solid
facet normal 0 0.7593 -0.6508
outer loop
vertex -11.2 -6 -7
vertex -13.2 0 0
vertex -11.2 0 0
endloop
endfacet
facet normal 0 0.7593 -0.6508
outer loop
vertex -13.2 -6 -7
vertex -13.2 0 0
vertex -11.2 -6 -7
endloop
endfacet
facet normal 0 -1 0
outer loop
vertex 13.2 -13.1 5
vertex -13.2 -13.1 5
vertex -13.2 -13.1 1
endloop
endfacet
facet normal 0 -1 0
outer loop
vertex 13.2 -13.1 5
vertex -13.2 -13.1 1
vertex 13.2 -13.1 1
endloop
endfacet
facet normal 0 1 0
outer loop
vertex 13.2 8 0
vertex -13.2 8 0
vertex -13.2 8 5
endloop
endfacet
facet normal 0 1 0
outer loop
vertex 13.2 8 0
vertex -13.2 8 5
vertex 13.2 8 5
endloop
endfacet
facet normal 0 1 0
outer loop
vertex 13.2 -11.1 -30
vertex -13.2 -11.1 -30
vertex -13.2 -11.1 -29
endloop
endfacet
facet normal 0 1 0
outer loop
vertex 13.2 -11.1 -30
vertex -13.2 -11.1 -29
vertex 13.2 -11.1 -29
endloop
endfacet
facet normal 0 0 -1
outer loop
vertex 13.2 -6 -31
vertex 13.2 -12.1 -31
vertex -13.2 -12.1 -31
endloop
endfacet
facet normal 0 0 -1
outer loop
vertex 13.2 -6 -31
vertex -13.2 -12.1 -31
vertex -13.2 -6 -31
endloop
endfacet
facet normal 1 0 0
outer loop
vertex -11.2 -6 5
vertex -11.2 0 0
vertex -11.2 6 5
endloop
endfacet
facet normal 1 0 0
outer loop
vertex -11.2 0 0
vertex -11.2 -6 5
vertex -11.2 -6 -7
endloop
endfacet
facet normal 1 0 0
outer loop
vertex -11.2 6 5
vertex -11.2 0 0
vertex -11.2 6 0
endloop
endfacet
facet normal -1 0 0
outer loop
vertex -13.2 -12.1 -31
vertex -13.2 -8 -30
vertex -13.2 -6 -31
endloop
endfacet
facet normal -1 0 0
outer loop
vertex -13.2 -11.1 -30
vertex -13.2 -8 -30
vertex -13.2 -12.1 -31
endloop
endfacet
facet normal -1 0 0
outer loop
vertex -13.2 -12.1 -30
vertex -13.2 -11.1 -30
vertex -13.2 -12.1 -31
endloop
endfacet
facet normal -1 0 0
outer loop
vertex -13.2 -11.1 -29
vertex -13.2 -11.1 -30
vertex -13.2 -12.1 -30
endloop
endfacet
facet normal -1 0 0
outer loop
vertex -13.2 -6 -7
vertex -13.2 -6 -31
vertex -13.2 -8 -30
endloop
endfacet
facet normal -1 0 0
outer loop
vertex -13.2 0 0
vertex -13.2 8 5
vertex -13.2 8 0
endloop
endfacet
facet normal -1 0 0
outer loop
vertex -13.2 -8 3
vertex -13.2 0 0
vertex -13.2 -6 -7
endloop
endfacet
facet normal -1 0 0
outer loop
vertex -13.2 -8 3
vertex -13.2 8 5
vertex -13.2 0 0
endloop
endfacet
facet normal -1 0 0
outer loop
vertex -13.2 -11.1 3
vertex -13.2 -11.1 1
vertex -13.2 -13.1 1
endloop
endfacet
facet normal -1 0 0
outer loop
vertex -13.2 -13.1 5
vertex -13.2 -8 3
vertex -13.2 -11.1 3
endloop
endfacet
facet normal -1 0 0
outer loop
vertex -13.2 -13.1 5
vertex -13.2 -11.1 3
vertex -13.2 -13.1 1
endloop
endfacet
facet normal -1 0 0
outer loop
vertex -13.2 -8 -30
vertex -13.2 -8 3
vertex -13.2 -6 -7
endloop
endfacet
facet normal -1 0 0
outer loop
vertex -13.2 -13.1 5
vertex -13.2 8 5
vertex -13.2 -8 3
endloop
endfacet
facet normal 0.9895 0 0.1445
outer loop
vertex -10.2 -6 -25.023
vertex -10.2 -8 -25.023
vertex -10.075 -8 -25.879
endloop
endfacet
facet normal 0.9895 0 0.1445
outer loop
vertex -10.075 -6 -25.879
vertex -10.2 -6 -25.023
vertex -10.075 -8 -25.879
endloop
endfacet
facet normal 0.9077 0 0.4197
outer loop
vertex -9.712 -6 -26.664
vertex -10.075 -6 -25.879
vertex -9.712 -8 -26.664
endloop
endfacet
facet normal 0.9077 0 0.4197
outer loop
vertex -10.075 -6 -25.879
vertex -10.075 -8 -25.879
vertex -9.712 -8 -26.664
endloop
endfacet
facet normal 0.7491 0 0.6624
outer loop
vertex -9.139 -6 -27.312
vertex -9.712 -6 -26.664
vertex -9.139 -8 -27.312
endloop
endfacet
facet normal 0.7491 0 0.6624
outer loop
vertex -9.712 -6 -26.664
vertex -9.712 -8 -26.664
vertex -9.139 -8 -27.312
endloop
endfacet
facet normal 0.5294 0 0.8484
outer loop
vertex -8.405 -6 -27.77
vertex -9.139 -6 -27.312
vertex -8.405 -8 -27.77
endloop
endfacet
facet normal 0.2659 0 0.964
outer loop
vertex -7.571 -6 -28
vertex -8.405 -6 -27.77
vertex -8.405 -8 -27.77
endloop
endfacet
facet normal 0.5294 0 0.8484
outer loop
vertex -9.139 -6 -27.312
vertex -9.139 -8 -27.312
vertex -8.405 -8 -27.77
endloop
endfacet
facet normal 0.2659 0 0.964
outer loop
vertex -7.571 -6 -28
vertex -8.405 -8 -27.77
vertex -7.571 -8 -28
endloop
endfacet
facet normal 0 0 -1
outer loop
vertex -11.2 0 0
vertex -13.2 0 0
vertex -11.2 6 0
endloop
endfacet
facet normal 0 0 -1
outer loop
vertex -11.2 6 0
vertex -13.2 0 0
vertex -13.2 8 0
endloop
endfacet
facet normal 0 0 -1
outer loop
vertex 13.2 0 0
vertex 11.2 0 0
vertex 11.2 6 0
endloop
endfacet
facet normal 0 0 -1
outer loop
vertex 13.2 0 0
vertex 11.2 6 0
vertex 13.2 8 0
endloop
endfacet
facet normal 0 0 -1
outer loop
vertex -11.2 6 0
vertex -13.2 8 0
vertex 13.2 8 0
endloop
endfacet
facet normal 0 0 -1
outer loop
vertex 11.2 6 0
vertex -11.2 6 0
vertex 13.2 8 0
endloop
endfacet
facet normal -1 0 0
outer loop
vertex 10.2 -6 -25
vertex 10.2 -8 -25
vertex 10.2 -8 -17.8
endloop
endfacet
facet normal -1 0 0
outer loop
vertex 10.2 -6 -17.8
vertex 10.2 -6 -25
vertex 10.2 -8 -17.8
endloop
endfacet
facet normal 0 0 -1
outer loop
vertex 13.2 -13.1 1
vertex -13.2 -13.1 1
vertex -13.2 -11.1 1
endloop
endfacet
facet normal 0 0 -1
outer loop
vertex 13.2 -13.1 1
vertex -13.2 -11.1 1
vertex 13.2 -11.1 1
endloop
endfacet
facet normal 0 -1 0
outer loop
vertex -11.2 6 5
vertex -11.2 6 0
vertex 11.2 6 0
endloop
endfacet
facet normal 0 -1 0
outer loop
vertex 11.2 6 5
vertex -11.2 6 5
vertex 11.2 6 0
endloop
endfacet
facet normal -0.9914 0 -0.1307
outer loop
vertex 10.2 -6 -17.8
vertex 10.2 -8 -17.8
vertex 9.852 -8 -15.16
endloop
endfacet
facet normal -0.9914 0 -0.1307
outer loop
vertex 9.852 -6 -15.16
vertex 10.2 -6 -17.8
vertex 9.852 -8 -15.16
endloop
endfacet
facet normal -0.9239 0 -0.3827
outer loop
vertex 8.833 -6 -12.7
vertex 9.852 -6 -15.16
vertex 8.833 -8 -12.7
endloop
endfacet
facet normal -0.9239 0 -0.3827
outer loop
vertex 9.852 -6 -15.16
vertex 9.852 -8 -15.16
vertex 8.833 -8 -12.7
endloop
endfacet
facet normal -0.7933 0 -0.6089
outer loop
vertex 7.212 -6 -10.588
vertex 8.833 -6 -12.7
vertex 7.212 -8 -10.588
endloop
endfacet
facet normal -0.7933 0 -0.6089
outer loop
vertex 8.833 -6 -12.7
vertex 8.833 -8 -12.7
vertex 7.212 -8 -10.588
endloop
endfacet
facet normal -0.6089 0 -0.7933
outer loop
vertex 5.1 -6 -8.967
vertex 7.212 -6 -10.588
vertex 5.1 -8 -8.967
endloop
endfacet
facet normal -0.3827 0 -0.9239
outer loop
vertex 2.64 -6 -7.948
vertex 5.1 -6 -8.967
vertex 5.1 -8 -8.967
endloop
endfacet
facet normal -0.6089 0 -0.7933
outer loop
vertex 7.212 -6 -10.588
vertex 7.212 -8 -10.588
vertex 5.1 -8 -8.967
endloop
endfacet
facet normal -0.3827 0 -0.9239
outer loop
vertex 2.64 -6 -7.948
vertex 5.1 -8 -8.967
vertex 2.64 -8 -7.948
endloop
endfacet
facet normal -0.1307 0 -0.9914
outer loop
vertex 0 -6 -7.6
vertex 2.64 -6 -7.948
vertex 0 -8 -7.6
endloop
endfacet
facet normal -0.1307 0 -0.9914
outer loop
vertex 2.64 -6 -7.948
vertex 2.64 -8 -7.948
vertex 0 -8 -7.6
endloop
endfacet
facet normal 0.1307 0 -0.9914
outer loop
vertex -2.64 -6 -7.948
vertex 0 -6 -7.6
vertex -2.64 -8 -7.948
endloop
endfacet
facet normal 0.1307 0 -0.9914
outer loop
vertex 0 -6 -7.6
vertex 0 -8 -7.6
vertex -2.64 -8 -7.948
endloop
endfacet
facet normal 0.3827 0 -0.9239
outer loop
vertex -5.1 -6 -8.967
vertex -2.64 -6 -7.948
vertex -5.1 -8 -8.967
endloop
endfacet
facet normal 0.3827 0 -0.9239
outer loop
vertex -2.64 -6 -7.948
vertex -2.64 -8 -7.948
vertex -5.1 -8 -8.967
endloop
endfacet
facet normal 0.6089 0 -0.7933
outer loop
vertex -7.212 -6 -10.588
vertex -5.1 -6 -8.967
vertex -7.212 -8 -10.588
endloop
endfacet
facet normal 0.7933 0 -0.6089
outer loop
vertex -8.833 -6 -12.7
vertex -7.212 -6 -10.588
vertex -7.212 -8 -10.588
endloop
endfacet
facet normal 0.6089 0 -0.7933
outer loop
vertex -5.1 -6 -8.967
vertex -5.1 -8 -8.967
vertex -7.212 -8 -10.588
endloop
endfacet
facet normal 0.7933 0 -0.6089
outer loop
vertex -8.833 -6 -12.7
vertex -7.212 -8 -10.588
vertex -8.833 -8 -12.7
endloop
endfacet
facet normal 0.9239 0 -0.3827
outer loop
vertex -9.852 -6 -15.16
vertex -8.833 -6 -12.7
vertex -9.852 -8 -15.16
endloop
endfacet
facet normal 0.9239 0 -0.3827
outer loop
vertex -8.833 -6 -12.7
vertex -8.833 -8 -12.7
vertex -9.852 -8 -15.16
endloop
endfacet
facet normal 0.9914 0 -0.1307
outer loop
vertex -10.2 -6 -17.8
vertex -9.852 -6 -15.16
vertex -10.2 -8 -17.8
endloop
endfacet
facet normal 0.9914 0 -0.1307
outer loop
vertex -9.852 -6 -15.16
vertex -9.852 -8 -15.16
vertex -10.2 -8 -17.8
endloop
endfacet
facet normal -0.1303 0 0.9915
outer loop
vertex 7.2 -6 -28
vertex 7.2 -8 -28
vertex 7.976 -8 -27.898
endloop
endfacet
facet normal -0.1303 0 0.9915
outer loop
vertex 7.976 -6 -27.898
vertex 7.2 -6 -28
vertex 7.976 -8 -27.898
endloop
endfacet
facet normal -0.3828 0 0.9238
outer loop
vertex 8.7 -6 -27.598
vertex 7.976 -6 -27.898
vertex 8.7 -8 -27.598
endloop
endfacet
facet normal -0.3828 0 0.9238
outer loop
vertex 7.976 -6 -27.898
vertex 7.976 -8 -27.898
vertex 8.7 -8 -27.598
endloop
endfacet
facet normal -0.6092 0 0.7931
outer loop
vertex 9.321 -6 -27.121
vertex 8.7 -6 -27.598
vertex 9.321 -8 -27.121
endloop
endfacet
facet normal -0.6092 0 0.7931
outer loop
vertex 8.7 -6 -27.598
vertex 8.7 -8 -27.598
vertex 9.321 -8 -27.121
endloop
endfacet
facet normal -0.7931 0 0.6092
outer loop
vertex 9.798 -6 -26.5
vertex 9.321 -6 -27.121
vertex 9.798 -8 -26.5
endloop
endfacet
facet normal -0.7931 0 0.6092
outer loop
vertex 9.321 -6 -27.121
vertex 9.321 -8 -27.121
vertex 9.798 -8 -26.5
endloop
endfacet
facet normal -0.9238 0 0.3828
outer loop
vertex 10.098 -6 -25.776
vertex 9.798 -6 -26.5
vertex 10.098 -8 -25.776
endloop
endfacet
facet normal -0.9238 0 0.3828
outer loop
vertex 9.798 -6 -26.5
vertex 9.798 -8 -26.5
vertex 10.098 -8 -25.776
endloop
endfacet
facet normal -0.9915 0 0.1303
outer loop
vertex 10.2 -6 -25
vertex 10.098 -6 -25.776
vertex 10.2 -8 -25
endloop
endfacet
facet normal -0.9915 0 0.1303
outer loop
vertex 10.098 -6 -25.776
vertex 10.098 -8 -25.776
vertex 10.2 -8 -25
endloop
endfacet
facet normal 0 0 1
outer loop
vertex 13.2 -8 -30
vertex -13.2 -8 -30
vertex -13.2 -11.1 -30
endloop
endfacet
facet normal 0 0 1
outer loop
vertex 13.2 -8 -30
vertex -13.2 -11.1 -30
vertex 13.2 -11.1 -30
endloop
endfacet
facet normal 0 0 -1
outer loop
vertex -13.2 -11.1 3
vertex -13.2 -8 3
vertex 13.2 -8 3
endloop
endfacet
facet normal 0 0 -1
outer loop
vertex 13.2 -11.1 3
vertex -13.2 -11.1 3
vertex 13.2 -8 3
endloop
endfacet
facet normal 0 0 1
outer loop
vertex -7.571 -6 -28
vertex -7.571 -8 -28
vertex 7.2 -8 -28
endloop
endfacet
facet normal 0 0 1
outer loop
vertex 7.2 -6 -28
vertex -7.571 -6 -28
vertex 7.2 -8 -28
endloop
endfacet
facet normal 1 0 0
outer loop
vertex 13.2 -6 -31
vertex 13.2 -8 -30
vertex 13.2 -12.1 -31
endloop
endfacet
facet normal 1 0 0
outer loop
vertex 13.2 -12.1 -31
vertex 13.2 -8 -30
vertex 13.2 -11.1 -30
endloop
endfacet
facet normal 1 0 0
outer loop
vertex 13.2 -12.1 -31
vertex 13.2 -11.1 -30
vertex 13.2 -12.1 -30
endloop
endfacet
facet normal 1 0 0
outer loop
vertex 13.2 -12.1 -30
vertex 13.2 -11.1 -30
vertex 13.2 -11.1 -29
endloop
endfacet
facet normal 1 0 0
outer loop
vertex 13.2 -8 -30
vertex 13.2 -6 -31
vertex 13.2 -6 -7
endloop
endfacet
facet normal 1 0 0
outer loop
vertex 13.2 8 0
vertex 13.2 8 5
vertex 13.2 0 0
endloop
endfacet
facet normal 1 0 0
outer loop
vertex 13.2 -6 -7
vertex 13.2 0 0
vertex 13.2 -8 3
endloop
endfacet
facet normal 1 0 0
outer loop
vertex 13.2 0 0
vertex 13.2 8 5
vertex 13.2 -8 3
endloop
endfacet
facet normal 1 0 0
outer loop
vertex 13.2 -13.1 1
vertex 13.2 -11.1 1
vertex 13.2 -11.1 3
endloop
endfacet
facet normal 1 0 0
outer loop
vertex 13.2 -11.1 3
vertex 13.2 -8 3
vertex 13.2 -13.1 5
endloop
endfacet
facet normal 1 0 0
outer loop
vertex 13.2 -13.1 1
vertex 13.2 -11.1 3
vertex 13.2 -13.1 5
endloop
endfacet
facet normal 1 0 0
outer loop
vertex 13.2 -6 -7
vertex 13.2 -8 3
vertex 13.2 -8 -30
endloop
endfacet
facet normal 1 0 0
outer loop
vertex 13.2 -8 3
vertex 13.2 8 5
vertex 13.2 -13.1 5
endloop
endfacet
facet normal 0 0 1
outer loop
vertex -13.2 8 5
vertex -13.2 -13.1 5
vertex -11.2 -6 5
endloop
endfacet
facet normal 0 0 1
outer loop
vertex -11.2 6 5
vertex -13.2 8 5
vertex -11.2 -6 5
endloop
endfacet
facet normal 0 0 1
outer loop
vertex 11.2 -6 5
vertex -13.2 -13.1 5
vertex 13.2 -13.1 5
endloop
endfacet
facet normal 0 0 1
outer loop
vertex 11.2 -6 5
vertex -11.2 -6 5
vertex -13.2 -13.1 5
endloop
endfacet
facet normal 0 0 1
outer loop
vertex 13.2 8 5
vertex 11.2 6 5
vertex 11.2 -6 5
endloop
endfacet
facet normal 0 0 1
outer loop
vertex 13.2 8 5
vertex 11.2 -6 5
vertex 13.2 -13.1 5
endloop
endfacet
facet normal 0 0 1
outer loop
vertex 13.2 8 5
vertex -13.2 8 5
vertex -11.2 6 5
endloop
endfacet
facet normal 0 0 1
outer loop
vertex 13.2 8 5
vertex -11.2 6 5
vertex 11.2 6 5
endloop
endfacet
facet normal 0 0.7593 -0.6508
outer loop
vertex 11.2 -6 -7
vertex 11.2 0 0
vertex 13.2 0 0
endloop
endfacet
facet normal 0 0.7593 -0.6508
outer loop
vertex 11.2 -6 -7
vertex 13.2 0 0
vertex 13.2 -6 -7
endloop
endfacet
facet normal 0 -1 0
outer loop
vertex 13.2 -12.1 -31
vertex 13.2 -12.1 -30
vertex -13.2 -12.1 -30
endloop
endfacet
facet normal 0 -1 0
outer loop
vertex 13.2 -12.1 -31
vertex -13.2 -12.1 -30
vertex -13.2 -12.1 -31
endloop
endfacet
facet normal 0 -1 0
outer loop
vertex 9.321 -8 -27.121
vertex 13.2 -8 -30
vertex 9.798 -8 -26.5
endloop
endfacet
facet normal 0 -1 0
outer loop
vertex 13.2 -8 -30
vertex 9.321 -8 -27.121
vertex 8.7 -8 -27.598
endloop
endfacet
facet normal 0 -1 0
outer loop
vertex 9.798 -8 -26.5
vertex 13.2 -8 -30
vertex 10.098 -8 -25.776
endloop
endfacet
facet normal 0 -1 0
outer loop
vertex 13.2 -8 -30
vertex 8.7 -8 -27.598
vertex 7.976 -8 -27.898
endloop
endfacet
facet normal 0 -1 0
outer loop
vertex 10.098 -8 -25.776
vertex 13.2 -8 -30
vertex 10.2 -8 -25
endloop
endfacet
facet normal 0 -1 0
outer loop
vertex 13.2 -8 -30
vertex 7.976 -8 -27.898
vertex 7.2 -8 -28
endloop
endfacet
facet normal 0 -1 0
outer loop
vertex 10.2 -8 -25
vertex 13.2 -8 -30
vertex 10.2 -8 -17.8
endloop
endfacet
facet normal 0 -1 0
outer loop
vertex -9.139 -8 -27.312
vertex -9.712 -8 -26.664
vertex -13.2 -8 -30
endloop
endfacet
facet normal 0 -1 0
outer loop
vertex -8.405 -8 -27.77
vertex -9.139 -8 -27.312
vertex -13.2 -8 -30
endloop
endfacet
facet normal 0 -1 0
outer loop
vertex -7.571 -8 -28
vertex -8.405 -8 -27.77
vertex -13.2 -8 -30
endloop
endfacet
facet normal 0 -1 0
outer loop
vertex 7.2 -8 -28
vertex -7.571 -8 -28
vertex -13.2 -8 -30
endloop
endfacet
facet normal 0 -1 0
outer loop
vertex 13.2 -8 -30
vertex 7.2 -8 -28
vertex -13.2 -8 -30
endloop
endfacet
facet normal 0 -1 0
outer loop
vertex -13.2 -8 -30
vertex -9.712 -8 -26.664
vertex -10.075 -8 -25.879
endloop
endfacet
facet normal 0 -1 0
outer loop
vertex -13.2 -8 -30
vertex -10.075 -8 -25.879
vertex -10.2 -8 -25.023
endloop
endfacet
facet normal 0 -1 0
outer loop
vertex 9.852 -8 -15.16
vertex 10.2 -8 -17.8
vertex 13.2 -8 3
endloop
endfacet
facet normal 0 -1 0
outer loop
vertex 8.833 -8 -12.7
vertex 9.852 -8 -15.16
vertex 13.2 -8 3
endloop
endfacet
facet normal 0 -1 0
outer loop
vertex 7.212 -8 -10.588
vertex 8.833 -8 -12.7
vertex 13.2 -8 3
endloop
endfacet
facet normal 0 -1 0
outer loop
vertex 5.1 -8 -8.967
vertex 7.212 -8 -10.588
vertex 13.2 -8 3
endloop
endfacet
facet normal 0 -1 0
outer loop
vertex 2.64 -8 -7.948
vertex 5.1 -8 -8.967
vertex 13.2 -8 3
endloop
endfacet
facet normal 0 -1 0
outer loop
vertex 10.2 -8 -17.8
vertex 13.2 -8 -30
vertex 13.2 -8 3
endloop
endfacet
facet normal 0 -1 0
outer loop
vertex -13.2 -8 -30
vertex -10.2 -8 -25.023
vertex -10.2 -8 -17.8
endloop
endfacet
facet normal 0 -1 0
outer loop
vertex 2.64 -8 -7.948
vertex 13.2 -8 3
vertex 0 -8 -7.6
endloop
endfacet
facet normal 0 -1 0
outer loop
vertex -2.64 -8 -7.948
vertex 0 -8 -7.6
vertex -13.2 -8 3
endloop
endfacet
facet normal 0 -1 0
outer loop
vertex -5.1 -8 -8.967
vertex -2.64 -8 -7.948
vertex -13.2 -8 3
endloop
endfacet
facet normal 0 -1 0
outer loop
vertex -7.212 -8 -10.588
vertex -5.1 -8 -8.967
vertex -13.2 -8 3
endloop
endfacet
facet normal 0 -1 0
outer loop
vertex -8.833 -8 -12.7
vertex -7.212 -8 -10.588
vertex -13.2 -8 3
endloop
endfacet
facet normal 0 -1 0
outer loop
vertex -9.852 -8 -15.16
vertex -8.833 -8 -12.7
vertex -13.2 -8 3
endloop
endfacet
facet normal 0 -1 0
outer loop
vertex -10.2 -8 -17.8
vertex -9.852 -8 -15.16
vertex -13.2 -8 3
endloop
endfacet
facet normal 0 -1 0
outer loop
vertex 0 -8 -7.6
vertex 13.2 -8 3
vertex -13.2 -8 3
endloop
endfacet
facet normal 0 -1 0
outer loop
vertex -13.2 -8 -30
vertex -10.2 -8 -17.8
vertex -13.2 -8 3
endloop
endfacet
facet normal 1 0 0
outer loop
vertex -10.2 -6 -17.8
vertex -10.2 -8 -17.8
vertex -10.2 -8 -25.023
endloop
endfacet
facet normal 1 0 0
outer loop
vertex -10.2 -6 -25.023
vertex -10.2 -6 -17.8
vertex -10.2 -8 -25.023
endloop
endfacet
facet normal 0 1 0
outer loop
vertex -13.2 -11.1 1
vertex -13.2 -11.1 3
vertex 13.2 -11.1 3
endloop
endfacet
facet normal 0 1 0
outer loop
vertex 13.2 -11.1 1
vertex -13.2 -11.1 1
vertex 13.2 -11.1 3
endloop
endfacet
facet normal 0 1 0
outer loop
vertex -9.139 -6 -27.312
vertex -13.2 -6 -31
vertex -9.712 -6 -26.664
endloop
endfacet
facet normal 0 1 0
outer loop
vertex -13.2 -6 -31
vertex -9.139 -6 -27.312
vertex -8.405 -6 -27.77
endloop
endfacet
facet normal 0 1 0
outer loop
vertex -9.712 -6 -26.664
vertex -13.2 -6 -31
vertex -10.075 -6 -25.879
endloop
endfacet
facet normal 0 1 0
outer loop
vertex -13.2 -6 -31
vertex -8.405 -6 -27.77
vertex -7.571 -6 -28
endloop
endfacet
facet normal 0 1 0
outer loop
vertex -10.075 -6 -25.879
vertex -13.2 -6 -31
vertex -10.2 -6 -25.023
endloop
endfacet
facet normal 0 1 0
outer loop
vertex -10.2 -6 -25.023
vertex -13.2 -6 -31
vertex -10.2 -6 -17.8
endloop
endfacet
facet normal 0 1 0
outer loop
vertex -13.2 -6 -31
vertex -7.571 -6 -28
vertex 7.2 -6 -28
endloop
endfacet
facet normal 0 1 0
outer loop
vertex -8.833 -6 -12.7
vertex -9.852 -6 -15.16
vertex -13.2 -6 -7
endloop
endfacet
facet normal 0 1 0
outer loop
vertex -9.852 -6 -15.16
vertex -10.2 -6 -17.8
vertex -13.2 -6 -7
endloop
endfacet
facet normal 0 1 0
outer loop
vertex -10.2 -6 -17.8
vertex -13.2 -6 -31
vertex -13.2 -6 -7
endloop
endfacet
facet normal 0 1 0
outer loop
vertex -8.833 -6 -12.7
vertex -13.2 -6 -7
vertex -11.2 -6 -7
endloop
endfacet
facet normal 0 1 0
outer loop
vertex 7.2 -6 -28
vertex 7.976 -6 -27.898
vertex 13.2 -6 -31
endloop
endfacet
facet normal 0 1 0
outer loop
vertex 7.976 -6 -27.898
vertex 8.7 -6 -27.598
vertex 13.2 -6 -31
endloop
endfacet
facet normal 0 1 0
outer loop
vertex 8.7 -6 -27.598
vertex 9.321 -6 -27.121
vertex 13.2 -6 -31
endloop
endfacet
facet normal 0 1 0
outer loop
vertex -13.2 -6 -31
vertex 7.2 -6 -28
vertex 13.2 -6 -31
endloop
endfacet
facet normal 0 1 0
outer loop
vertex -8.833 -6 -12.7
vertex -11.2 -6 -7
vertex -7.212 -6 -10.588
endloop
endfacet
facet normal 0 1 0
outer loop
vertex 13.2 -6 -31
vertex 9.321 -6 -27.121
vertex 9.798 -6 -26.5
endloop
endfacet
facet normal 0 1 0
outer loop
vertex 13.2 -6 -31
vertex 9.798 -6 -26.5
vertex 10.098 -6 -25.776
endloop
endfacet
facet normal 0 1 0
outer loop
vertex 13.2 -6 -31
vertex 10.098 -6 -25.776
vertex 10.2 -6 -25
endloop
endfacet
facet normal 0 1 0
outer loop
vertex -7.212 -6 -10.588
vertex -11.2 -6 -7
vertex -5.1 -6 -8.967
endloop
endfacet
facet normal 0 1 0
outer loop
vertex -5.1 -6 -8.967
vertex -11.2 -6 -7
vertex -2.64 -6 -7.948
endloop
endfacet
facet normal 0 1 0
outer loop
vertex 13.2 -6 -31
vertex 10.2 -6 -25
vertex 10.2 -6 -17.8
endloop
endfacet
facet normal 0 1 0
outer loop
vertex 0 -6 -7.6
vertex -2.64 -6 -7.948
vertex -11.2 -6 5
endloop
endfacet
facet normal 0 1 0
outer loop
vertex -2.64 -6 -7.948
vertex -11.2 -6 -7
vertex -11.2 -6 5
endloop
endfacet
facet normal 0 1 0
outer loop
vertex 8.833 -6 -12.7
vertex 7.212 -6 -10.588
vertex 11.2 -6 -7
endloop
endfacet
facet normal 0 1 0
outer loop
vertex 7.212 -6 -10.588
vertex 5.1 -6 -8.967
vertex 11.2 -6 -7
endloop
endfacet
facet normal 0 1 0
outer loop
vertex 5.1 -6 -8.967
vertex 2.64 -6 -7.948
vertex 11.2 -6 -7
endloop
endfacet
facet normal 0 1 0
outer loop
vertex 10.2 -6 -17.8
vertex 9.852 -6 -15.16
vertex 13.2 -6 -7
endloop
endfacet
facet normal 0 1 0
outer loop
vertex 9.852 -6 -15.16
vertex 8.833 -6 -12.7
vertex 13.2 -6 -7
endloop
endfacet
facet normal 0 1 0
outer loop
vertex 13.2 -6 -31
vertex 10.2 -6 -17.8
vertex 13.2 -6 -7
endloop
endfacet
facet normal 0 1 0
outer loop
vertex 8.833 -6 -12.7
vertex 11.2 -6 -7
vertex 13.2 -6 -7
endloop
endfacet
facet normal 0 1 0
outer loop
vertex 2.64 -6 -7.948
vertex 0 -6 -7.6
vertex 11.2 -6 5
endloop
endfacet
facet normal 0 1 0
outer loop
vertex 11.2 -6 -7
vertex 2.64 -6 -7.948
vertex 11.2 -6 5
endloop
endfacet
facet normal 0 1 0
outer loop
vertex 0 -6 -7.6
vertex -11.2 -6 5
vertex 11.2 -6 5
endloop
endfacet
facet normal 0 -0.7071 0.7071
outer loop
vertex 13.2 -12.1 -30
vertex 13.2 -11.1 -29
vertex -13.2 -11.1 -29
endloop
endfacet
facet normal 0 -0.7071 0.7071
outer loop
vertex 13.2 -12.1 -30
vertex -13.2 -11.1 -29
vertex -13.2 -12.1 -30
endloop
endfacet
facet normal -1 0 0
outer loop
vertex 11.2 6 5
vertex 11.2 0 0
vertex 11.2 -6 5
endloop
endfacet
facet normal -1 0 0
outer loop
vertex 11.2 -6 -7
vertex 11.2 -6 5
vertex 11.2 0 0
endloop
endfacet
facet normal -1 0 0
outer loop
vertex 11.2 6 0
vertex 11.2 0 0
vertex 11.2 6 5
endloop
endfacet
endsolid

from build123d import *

# Parameters (mm, degrees)
F0_W       = 26.4
F0_H       = 16
F0_W_2     = 22.4
F0_H_2     = 12
F1_DEPTH   = 5
F3_DEPTH   = 32
F4_W       = 26.4
F4_H       = 2
F5_DEPTH   = 5.1
F6_W       = 26.4
F6_H       = 2
F7_DEPTH   = 2
F8_W       = 26.4
F8_H       = 2
F9_DEPTH   = 1
F11_DEPTH  = 26.401
F13_DEPTH  = 2
F14_DEPTH  = 26.4
F14_FACE_W = 22.4
F14_FACE_H = 6
F15_DEPTH  = 31.001
F16_DEPTH  = 25


with BuildPart() as f1:
    # F0 (on Top) → F1 (new body)
    with BuildSketch(Plane.XY):
        Rectangle(F0_W, F0_H)
        Rectangle(F0_W_2, F0_H_2, mode=Mode.SUBTRACT)
    extrude(amount=F1_DEPTH)

    # F2 (on face) → F3 (join)
    with BuildSketch(Plane(origin=(0, 0, 0), x_dir=(1, 0, 0), z_dir=(0, 0, -1))):
        Polygon((13.2, 8), (-13.2, 8), (-13.2, 6), (-11.2, 6), (11.2, 6), (13.2, 6), align=None)
    extrude(amount=F3_DEPTH)

    # F4 (on face) → F5 (join)
    with BuildSketch(Plane.XZ.offset(8)):
        with Locations((0, 4)):
            Rectangle(F4_W, F4_H)
        with Locations((0, -31)):
            Rectangle(F4_W, F4_H)
    extrude(amount=F5_DEPTH)

    # F6 (on face) → F7 (join)
    with BuildSketch(Plane(origin=(0, 0, 3), x_dir=(1, 0, 0), z_dir=(0, 0, -1))):
        with Locations((0, 12.1)):
            Rectangle(F6_W, F6_H)
    extrude(amount=F7_DEPTH)

    # F8 (on face) → F9 (join)
    with BuildSketch(Plane.XY.offset(-30)):
        with Locations((0, -12.1)):
            Rectangle(F8_W, F8_H)
    extrude(amount=F9_DEPTH)

    # F10 (on face) → F11 (cut, through all)
    with BuildSketch(Plane(origin=(-13.2, 0, 0), x_dir=(0, -1, 0), z_dir=(-1, 0, 0))):
        Polygon((11.1, -29), (12.1, -30), (12.1, -31), (6, -31), (6, -32), (13.1, -32), (13.1, -29), align=None)
    extrude(amount=-F11_DEPTH, mode=Mode.SUBTRACT)

    # F12 (on face) → F13 (join, through all)
    with BuildSketch(Plane(origin=(-13.2, 0, 0), x_dir=(0, -1, 0), z_dir=(-1, 0, 0))):
        Polygon((0, 0), (6, 0), (6, -7), (6, -31), (12.1, -31), (12.1, -30), (11.1, -29), (11.1, -30), (8, -30), (8, 3), (11.1, 3), (11.1, 1), (13.1, 1), (13.1, 5), (-8, 5), (-8, 0), align=None)
    extrude(amount=-F13_DEPTH)

    # F12 (on face) → F14 (join, through all)
    with BuildSketch(Plane(origin=(-13.2, 0, 0), x_dir=(0, -1, 0), z_dir=(-1, 0, 0))):
        Polygon((6, -7), (6, 0), (0, 0), align=None)
    extrude(amount=-F14_DEPTH)

    # F14_face (on face) → F15 (cut, through all)
    with BuildSketch(Plane(origin=(0, -3, 0), x_dir=(1, 0, 0), z_dir=(0, 0, 1))):
        Rectangle(F14_FACE_W, F14_FACE_H)
    extrude(amount=-F15_DEPTH, mode=Mode.SUBTRACT)

    # F4 (on face) → F16 (cut)
    with BuildSketch(Plane.XZ.offset(8)):
        with BuildLine():
            ThreePointArc((-10.2, -25.023081), (-9.448807, -27.008746), (-7.571423, -28))
            Line((-7.571423, -28), (7.2, -28))
            ThreePointArc((7.2, -28), (9.32132, -27.12132), (10.2, -25))
            Line((10.2, -25), (10.2, -17.8))
            ThreePointArc((10.2, -17.8), (0, -7.6), (-10.2, -17.8))
            Line((-10.2, -17.8), (-10.2, -25.023081))
        make_face()
    extrude(amount=-F16_DEPTH, mode=Mode.SUBTRACT)


solid = f1.part
